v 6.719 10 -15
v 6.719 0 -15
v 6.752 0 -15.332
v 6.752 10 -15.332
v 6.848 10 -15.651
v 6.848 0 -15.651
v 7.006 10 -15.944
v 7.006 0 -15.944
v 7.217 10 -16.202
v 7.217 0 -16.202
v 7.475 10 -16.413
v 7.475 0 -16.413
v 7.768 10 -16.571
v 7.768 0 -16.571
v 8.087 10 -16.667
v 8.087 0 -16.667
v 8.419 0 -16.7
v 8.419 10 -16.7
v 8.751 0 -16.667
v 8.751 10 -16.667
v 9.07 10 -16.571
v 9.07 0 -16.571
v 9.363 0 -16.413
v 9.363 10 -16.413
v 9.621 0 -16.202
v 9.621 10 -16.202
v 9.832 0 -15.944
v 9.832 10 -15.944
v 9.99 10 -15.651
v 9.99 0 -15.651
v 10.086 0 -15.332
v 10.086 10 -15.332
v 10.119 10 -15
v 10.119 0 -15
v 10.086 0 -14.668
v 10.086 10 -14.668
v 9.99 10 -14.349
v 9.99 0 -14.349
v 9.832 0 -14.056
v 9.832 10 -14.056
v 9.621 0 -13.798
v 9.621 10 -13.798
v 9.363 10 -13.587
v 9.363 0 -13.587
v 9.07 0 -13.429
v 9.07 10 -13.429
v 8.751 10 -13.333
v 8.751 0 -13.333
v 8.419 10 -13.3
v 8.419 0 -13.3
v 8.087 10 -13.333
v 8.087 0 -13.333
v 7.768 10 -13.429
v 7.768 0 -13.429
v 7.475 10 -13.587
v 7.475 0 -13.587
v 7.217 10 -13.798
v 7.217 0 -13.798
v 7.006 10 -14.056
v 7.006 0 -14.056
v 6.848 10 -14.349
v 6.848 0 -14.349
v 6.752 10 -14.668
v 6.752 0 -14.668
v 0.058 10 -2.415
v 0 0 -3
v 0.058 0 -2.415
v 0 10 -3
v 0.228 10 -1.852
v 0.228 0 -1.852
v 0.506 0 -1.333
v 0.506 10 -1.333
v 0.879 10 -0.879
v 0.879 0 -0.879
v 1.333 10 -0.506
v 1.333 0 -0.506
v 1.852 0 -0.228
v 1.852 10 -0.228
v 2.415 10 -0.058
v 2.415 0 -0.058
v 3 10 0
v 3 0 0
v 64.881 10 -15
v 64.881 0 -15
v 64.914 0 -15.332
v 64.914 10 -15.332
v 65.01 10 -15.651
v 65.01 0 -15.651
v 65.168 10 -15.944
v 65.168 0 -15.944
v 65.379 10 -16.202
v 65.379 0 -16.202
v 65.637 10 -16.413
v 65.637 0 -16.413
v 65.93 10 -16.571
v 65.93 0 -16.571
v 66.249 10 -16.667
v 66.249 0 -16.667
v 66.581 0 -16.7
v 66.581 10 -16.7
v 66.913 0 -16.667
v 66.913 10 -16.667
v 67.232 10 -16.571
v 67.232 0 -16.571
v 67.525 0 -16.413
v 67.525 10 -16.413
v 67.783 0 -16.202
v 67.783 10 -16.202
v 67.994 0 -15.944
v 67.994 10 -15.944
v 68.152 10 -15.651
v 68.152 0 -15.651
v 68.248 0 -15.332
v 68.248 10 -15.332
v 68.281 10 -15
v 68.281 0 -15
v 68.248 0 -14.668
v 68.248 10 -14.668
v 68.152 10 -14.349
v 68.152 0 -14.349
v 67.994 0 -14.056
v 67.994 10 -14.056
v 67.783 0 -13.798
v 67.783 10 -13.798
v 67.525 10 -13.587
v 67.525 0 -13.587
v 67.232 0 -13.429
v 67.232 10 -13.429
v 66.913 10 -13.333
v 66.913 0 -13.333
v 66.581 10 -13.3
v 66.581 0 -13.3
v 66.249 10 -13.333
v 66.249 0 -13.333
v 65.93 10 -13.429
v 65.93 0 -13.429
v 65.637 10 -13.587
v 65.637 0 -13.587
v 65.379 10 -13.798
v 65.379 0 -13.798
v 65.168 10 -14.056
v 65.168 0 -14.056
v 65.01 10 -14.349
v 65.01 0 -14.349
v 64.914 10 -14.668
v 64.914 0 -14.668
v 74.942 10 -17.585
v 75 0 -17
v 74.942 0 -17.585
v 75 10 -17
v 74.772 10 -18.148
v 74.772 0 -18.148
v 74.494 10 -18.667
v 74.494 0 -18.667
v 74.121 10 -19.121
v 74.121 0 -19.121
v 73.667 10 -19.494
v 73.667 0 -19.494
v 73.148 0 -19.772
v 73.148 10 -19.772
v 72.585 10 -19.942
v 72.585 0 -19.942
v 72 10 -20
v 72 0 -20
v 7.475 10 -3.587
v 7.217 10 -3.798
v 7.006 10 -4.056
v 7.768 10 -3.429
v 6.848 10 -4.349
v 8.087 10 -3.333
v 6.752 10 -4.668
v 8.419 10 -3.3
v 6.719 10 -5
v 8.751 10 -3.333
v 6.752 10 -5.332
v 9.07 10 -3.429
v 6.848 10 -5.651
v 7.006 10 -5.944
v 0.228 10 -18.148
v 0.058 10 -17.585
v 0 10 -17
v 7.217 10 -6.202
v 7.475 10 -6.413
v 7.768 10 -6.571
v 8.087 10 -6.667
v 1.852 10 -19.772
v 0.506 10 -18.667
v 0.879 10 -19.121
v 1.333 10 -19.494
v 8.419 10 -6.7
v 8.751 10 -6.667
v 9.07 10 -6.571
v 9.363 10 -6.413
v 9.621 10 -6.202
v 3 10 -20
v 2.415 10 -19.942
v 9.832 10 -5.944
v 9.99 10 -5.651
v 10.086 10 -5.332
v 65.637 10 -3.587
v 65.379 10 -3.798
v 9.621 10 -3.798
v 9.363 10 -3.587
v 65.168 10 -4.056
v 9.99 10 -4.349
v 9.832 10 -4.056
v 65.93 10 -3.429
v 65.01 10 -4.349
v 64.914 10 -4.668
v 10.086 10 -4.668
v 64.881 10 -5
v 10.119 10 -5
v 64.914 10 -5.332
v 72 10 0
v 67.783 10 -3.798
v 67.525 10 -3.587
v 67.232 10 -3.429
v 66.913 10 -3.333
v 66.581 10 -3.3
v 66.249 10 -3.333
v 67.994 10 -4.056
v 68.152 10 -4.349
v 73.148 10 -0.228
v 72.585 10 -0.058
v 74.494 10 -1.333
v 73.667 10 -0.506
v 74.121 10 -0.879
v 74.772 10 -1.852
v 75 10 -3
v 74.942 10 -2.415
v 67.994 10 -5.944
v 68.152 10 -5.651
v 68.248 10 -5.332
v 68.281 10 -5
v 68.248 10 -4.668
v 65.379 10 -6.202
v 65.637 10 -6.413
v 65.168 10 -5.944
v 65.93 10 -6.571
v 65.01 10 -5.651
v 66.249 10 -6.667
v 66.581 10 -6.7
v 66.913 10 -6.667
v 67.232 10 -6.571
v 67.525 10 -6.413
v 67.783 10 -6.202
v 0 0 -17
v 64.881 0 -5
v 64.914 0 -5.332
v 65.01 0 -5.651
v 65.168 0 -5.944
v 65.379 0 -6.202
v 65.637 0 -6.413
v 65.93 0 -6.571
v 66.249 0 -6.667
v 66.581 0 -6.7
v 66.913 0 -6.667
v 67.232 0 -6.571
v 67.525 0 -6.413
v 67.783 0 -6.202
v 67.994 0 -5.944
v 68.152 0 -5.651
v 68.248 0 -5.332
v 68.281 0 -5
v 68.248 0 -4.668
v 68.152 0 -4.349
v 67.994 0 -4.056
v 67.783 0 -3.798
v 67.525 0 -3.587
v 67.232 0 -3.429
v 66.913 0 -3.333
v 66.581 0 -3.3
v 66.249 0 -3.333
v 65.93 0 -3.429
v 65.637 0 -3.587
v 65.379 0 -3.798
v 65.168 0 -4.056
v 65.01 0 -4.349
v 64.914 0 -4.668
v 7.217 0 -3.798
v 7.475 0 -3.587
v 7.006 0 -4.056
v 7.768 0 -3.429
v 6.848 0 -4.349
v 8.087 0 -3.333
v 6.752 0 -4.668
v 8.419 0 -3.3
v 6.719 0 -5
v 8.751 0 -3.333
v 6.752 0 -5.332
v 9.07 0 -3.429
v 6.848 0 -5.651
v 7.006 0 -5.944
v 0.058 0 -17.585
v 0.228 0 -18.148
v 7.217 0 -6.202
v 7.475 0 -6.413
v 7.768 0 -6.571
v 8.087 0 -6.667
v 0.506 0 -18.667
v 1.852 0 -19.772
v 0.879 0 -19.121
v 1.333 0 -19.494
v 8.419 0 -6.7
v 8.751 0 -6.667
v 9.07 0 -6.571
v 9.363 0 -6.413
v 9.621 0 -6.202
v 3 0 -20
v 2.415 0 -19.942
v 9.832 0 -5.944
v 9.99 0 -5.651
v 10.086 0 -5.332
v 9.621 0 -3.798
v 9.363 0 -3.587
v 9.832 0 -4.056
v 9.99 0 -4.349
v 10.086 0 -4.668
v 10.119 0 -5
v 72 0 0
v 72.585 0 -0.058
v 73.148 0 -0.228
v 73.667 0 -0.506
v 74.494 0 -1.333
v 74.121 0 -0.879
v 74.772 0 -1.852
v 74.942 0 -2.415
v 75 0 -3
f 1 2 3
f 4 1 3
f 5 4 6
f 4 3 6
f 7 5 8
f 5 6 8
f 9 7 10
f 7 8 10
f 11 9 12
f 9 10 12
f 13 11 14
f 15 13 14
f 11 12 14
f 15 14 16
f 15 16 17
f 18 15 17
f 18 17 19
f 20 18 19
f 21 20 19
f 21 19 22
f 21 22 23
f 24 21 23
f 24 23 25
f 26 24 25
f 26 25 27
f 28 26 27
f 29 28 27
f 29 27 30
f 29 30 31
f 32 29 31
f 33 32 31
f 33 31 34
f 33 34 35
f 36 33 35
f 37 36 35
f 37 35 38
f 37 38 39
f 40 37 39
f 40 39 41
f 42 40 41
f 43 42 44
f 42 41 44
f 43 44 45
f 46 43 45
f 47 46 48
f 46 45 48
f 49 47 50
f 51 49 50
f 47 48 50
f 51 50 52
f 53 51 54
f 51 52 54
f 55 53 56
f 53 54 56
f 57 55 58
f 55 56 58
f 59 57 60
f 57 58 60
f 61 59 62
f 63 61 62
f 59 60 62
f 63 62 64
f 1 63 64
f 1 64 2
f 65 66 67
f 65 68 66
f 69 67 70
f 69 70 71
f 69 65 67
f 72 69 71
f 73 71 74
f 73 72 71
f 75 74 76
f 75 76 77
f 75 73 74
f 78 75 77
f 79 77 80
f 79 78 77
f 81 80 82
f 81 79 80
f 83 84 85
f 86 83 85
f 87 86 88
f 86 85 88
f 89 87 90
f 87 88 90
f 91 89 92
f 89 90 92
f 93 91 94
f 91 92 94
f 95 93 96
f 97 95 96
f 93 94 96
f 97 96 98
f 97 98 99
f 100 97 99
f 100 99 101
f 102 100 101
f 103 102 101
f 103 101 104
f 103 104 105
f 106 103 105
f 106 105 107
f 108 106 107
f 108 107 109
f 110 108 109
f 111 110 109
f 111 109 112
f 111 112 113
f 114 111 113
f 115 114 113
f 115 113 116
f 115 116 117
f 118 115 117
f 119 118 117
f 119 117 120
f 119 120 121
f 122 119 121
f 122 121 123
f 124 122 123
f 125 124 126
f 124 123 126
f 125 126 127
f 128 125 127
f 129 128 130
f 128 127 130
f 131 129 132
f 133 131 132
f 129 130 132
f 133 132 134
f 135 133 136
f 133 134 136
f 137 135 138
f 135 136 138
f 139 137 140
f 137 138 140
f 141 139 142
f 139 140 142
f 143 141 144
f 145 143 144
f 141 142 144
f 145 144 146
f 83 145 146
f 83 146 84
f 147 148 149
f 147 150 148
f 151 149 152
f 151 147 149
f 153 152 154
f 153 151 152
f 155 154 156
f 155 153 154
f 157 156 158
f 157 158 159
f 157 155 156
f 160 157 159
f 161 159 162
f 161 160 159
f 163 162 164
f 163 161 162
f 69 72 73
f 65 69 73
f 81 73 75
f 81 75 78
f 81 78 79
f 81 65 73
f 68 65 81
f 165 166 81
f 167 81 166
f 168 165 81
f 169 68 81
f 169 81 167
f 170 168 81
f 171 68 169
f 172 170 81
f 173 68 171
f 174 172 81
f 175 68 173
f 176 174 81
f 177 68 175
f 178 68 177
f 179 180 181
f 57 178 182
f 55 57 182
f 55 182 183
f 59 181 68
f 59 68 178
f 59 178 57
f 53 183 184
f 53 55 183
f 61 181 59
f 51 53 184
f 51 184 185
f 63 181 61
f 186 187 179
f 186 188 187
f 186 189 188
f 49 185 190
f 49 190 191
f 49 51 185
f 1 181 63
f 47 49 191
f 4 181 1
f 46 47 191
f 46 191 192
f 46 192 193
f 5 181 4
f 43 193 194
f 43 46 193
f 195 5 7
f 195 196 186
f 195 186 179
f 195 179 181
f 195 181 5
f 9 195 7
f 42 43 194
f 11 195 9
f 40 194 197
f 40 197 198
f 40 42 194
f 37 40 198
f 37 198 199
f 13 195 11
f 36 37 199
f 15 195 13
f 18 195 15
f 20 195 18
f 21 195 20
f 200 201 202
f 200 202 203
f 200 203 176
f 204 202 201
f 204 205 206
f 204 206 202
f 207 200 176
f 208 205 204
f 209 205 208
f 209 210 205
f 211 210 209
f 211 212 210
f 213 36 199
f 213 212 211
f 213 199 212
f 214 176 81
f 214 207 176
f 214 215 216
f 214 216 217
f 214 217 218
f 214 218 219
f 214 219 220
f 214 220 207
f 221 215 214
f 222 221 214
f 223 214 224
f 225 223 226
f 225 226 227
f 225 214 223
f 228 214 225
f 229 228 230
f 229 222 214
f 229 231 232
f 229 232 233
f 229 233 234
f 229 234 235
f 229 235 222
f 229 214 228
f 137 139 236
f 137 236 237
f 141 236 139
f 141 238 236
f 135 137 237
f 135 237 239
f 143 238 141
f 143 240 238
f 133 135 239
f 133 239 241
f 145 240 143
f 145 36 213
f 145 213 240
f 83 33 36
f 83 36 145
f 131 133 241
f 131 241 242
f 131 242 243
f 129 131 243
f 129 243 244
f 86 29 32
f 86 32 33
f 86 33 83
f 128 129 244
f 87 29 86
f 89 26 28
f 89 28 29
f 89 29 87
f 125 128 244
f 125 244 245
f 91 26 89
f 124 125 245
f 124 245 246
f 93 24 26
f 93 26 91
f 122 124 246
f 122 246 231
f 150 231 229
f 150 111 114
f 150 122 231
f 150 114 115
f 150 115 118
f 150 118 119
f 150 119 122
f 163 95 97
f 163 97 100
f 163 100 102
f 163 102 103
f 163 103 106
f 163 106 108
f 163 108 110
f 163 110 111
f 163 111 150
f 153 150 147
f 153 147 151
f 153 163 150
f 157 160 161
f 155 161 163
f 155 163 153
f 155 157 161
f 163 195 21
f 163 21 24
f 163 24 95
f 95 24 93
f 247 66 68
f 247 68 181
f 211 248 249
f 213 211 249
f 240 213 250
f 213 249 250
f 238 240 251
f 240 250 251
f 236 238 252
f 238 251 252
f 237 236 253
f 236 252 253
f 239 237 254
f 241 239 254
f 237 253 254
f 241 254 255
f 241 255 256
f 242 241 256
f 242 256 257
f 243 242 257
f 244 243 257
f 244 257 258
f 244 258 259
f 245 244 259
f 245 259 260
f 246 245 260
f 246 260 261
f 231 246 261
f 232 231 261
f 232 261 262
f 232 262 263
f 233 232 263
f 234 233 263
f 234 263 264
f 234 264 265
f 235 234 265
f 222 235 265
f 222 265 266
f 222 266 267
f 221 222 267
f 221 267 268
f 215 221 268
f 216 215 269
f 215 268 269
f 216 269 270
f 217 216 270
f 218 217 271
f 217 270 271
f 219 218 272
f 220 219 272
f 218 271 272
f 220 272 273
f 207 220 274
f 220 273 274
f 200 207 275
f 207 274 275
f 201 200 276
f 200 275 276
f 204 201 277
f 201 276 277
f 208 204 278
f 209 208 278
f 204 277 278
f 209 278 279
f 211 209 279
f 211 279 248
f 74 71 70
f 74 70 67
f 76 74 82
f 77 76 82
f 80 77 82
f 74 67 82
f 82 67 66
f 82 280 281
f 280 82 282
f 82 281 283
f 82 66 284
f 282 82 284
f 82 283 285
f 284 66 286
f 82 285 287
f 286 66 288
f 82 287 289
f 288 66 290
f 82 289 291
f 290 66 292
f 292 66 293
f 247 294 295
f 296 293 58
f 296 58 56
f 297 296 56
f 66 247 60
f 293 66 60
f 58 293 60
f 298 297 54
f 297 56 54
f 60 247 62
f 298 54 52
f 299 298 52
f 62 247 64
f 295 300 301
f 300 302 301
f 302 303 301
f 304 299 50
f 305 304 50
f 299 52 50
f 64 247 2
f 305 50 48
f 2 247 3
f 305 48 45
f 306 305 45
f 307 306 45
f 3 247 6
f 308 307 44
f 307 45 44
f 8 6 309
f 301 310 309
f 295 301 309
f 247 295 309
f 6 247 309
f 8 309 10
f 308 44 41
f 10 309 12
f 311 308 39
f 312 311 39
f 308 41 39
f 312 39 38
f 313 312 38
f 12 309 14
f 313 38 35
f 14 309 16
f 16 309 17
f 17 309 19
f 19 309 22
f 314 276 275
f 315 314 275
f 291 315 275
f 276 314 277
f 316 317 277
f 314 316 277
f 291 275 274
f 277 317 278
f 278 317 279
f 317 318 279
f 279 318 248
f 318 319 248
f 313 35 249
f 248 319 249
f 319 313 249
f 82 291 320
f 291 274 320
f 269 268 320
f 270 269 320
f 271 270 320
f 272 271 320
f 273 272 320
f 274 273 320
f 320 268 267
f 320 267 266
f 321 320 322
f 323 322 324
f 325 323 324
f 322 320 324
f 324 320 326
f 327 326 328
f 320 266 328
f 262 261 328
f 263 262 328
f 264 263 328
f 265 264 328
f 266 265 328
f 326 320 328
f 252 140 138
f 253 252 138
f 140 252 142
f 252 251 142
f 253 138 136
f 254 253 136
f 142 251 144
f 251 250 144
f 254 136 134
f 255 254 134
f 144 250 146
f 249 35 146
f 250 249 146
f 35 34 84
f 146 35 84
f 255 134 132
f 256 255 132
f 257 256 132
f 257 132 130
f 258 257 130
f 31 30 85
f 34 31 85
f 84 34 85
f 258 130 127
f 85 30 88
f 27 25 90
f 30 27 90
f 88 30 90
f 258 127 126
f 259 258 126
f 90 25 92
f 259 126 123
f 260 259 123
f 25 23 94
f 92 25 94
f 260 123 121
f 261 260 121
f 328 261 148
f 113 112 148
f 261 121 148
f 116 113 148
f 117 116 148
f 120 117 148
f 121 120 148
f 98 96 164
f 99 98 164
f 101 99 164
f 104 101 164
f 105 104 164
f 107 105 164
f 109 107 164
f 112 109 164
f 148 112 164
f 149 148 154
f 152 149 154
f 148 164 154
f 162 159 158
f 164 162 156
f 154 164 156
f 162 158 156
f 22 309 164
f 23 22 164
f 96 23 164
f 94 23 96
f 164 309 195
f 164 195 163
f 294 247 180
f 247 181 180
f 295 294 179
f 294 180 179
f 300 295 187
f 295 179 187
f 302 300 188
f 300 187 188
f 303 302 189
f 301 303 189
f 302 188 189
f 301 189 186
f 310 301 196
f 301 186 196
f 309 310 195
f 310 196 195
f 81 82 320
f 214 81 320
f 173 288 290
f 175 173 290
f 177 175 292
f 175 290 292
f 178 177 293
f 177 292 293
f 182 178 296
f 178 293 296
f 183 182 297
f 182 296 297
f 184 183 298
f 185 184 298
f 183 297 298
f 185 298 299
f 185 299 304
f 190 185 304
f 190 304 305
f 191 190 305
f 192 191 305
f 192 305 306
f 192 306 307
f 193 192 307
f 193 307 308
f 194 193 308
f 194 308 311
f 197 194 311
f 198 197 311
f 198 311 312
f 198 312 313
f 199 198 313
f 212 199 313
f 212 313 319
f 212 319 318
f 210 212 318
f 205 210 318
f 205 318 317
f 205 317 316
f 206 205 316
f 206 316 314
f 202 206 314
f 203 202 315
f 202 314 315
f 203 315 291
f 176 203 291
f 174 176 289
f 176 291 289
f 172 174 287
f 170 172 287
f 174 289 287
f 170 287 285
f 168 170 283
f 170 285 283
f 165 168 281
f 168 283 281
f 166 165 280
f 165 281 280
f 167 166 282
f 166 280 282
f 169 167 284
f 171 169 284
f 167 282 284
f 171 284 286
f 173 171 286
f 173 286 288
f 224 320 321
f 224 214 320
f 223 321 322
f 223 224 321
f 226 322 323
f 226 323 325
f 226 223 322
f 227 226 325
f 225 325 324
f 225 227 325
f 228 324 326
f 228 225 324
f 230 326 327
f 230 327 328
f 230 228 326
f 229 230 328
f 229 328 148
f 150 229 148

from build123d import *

# Parameters (mm, degrees)
SKETCH1_W            = 75
SKETCH1_H            = 20
BOSS_EXTRUDE1_DEPTH  = 10
FILLET1_R            = 3
M3_CLEARANCE_HOLE1_D = 3.4


with BuildPart() as part:
    # Sketch1 → Boss-Extrude1 (new body)
    with BuildSketch(Plane(origin=(0, 0, 0), x_dir=(1, 0, 0), z_dir=(0, 1, 0))):
        with Locations((37.5, 10)):
            Rectangle(SKETCH1_W, SKETCH1_H)
    extrude(amount=BOSS_EXTRUDE1_DEPTH)

    # Fillet1
    fillet1_edges = [part.edges().sort_by_distance(p)[0] for p in [
        (0, 5, -20),
        (75, 5, -20),
        (75, 5, 0),
        (0, 5, 0),
    ]]
    fillet(fillet1_edges, radius=FILLET1_R)

    # M3 Clearance Hole1 (through all)
    with Locations(Plane(origin=(67.535318197, 10, -35.416339767), x_dir=(1, 0, 0), z_dir=(0, 1, 0))):
        with Locations((-0.954318197, -20.416339767), (-0.954318197, -30.416339767), (-59.116318197, -30.416339767), (-59.116318197, -20.416339767)):
            Hole(M3_CLEARANCE_HOLE1_D / 2)


solid = part.part
